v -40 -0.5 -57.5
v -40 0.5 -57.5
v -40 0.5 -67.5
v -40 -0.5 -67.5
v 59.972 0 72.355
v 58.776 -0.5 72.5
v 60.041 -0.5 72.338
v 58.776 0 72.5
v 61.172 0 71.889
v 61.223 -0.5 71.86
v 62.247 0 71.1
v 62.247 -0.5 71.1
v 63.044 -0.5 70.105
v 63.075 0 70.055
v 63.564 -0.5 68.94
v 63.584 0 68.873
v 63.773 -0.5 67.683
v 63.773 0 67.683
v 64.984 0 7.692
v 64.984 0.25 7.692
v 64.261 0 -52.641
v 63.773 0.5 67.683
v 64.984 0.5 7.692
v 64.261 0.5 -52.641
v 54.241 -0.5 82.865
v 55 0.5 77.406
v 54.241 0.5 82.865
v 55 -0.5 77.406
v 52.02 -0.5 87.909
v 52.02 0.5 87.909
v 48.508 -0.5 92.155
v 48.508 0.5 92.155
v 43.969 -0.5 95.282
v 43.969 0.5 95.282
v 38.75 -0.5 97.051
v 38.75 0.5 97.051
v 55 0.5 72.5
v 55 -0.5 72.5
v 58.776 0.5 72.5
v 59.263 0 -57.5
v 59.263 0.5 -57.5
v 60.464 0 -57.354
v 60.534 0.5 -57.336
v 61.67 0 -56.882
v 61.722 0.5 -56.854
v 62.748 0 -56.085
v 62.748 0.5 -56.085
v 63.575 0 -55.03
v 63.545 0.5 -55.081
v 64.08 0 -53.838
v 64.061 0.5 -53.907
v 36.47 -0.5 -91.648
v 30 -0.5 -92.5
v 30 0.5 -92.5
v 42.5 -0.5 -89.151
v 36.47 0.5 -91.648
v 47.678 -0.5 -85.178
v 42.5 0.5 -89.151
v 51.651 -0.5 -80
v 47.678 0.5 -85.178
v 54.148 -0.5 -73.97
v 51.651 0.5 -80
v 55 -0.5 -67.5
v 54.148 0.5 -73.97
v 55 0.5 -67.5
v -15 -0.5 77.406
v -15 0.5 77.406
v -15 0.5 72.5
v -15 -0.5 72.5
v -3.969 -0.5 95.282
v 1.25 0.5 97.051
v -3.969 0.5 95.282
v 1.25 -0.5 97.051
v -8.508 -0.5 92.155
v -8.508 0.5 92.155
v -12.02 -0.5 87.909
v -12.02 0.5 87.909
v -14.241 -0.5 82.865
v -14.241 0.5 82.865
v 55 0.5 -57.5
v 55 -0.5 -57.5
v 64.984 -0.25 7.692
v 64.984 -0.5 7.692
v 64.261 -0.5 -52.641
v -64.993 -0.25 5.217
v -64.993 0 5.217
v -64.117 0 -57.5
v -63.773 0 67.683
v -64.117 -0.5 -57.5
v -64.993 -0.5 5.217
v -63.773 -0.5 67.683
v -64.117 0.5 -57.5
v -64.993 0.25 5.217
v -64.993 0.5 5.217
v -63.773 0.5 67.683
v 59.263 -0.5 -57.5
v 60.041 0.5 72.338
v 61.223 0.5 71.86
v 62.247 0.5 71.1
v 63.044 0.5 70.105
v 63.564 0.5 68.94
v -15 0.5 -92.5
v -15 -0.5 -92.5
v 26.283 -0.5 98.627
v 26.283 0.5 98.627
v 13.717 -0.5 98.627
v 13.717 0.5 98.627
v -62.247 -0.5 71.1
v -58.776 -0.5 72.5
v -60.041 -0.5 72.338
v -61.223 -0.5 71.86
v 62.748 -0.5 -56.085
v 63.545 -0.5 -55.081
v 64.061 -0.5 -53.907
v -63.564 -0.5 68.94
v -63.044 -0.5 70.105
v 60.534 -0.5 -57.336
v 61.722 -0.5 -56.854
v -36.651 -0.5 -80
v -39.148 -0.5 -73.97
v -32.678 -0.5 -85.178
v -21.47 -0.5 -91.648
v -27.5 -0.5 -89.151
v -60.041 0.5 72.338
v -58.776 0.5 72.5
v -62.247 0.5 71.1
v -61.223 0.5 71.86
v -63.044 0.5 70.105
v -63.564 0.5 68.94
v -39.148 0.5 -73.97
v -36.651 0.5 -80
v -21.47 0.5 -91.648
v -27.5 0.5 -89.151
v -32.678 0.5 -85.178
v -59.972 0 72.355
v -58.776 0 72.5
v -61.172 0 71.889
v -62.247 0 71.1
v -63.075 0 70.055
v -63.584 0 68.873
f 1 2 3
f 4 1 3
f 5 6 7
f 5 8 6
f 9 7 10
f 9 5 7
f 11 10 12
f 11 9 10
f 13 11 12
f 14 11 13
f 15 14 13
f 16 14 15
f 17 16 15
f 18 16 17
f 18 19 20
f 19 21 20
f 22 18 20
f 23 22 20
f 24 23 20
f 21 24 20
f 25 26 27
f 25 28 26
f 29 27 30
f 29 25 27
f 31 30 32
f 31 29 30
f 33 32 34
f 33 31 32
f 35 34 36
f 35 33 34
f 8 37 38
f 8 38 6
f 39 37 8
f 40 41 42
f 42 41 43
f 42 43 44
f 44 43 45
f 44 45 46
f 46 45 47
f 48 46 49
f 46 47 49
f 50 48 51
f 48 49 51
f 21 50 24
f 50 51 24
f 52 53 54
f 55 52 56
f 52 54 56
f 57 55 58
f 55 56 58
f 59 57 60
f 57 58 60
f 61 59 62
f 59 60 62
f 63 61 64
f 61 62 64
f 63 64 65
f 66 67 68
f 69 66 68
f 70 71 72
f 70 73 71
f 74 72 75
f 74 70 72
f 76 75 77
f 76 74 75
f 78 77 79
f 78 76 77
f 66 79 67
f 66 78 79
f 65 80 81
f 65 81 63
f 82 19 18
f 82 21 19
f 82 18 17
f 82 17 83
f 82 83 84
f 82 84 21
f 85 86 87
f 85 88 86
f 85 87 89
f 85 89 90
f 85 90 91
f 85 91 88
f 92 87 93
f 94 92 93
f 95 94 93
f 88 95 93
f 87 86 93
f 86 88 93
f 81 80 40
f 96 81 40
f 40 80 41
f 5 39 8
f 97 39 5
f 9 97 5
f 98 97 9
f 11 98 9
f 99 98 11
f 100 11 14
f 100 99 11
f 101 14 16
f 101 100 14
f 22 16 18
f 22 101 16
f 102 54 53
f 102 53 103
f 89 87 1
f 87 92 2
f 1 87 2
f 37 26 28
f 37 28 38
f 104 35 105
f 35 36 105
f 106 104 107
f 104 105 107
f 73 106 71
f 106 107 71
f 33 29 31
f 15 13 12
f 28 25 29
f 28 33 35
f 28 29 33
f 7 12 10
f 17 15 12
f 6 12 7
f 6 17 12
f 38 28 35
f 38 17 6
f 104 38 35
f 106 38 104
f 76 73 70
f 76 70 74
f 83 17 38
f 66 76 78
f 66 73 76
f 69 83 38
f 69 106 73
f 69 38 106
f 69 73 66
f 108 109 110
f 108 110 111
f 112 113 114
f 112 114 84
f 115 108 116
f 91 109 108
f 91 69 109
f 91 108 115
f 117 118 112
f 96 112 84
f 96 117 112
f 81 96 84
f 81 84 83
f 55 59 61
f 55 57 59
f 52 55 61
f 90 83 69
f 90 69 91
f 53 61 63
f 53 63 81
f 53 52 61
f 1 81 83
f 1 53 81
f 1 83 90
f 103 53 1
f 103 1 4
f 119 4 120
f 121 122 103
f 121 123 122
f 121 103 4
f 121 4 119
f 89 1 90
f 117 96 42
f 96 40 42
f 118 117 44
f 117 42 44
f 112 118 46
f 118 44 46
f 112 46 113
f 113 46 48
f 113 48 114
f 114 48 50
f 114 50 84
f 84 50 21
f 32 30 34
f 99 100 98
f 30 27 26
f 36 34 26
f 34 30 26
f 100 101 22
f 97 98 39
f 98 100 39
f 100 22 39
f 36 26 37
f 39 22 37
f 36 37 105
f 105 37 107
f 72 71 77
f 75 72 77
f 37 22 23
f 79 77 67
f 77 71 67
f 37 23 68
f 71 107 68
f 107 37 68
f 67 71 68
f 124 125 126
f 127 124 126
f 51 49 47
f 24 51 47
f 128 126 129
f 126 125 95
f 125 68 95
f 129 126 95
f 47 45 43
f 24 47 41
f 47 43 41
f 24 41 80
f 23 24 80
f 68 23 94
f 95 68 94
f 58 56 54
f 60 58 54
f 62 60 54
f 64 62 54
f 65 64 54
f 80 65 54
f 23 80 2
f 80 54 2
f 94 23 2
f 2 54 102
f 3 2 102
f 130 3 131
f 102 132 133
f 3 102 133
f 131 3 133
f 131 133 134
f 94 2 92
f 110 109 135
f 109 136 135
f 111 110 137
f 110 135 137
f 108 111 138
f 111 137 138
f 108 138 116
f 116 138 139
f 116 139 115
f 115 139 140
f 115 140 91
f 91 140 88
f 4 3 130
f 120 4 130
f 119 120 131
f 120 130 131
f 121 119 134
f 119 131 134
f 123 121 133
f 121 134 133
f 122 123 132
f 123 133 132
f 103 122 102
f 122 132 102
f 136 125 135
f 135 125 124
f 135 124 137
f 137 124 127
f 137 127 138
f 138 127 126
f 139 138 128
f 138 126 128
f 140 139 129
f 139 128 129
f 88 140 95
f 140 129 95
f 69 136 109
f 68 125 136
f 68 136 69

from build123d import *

# Parameters (mm, degrees)
EXTRUDE_1_DEPTH     = 0.5
SKETCH_3_W          = 25
SKETCH_3_H          = 35
CUT_EXTRUDE_1_DEPTH = 114.058613257
SKETCH_4_W          = 10
SKETCH_4_H          = 35
CUT_EXTRUDE_2_DEPTH = 114.058613257
SKETCH_5_W          = 50
SKETCH_5_H          = 20
CUT_EXTRUDE_3_DEPTH = 114.058613257
SKETCH_6_W          = 10
SKETCH_6_H          = 20
CUT_EXTRUDE_4_DEPTH = 114.058613257
EXTRUDE_2_DEPTH     = 0.5
CUT_EXTRUDE_5_DEPTH = 119.289418767
FILLET_1_R          = 5
FILLET_2_R          = 20


with BuildPart() as part:
    # ｽｹｯﾁ1 → ﾎﾞｽ - 押し出し1 (new, symmetric)
    with BuildSketch(Plane(origin=(0, 0, 0), x_dir=(1, 0, 0), z_dir=(0, 1, 0))):
        with BuildLine():
            Line((62.68888804, 92.5), (-62.68888804, 92.5))
            add(Edge.make_bspline(
                [(-62.68888804, 92.5), (-67.396314277, 0), (-62.68888804, -92.5)],
                knots=[4.444925752, 4.444925752, 4.444925752, 4.979852209, 4.979852209, 4.979852209], degree=2, weights=[1, 0.964444431, 1]))
            Line((-62.68888804, -92.5), (62.68888804, -92.5))
            add(Edge.make_bspline(
                [(62.68888804, -92.5), (67.396314277, 0), (62.68888804, 92.5)],
                knots=[1.303333099, 1.303333099, 1.303333099, 1.838259555, 1.838259555, 1.838259555], degree=2, weights=[1, 0.964444431, 1]))
        make_face()
    extrude(amount=EXTRUDE_1_DEPTH, both=True)

    # ｽｹｯﾁ3 → ｶｯﾄ - 押し出し1 (cut, through all)
    with BuildSketch(Plane(origin=(0, 0.5, 0), x_dir=(1, 0, 0), z_dir=(0, 1, 0))):
        with Locations((-52.5, 75)):
            Rectangle(SKETCH_3_W, SKETCH_3_H)
    extrude(amount=-CUT_EXTRUDE_1_DEPTH, mode=Mode.SUBTRACT)

    # ｽｹｯﾁ4 → ｶｯﾄ - 押し出し2 (cut, through all)
    with BuildSketch(Plane(origin=(0, 0.5, 0), x_dir=(1, 0, 0), z_dir=(0, 1, 0))):
        with Locations((60, 75)):
            Rectangle(SKETCH_4_W, SKETCH_4_H)
    extrude(amount=-CUT_EXTRUDE_2_DEPTH, mode=Mode.SUBTRACT)

    # ｽｹｯﾁ5 → ｶｯﾄ - 押し出し3 (cut, through all)
    with BuildSketch(Plane(origin=(0, 0.5, 0), x_dir=(1, 0, 0), z_dir=(0, 1, 0))):
        with Locations((-40, -82.5)):
            Rectangle(SKETCH_5_W, SKETCH_5_H)
    extrude(amount=-CUT_EXTRUDE_3_DEPTH, mode=Mode.SUBTRACT)

    # ｽｹｯﾁ6 → ｶｯﾄ - 押し出し4 (cut, through all)
    with BuildSketch(Plane(origin=(0, 0.5, 0), x_dir=(1, 0, 0), z_dir=(0, 1, 0))):
        with Locations((60, -82.5)):
            Rectangle(SKETCH_6_W, SKETCH_6_H)
    extrude(amount=-CUT_EXTRUDE_4_DEPTH, mode=Mode.SUBTRACT)

    # ｽｹｯﾁ7 → ﾎﾞｽ - 押し出し2 (add, symmetric)
    with BuildSketch(Plane(origin=(0, 0, 0), x_dir=(1, 0, 0), z_dir=(0, 1, 0))):
        with BuildLine():
            Line((-15, -92.5), (55, -92.5))
            ThreePointArc((55, -92.5), (20, -98.825030024), (-15, -92.5))
        make_face()
    extrude(amount=EXTRUDE_2_DEPTH, both=True)

    # ｽｹｯﾁ8 → ｶｯﾄ - 押し出し5 (cut, through all)
    with BuildSketch(Plane(origin=(0, 0.5, 0), x_dir=(1, 0, 0), z_dir=(0, 1, 0))):
        with BuildLine():
            ThreePointArc((-40, 67.5), (-32.677669545, 85.177669514), (-15.000000044, 92.5))
            Line((-15.000000044, 92.5), (-40, 92.5))
            Line((-40, 92.5), (-40, 67.5))
        make_face()
        with BuildLine():
            Line((55, 67.5), (55, 92.5))
            Line((55, 92.5), (30, 92.5))
            ThreePointArc((30, 92.5), (47.67766953, 85.17766953), (55, 67.5))
        make_face()
    extrude(amount=-CUT_EXTRUDE_5_DEPTH, mode=Mode.SUBTRACT)

    # ﾌｨﾚｯﾄ1
    fillet_1_edges = [part.edges().sort_by_distance(p)[0] for p in [
        (-63.590195865, -0.25, 72.5),
        (63.590195865, -0.2499997, 72.5),
        (64.116831739, -0.25, -57.5),
    ]]
    fillet(fillet_1_edges, radius=FILLET_1_R)

    # ﾌｨﾚｯﾄ2
    fillet_2_edges = [part.edges().sort_by_distance(p)[0] for p in [
        (-15, 0, 92.5),
        (55, 0, 92.5),
    ]]
    fillet(fillet_2_edges, radius=FILLET_2_R)


solid = part.part
